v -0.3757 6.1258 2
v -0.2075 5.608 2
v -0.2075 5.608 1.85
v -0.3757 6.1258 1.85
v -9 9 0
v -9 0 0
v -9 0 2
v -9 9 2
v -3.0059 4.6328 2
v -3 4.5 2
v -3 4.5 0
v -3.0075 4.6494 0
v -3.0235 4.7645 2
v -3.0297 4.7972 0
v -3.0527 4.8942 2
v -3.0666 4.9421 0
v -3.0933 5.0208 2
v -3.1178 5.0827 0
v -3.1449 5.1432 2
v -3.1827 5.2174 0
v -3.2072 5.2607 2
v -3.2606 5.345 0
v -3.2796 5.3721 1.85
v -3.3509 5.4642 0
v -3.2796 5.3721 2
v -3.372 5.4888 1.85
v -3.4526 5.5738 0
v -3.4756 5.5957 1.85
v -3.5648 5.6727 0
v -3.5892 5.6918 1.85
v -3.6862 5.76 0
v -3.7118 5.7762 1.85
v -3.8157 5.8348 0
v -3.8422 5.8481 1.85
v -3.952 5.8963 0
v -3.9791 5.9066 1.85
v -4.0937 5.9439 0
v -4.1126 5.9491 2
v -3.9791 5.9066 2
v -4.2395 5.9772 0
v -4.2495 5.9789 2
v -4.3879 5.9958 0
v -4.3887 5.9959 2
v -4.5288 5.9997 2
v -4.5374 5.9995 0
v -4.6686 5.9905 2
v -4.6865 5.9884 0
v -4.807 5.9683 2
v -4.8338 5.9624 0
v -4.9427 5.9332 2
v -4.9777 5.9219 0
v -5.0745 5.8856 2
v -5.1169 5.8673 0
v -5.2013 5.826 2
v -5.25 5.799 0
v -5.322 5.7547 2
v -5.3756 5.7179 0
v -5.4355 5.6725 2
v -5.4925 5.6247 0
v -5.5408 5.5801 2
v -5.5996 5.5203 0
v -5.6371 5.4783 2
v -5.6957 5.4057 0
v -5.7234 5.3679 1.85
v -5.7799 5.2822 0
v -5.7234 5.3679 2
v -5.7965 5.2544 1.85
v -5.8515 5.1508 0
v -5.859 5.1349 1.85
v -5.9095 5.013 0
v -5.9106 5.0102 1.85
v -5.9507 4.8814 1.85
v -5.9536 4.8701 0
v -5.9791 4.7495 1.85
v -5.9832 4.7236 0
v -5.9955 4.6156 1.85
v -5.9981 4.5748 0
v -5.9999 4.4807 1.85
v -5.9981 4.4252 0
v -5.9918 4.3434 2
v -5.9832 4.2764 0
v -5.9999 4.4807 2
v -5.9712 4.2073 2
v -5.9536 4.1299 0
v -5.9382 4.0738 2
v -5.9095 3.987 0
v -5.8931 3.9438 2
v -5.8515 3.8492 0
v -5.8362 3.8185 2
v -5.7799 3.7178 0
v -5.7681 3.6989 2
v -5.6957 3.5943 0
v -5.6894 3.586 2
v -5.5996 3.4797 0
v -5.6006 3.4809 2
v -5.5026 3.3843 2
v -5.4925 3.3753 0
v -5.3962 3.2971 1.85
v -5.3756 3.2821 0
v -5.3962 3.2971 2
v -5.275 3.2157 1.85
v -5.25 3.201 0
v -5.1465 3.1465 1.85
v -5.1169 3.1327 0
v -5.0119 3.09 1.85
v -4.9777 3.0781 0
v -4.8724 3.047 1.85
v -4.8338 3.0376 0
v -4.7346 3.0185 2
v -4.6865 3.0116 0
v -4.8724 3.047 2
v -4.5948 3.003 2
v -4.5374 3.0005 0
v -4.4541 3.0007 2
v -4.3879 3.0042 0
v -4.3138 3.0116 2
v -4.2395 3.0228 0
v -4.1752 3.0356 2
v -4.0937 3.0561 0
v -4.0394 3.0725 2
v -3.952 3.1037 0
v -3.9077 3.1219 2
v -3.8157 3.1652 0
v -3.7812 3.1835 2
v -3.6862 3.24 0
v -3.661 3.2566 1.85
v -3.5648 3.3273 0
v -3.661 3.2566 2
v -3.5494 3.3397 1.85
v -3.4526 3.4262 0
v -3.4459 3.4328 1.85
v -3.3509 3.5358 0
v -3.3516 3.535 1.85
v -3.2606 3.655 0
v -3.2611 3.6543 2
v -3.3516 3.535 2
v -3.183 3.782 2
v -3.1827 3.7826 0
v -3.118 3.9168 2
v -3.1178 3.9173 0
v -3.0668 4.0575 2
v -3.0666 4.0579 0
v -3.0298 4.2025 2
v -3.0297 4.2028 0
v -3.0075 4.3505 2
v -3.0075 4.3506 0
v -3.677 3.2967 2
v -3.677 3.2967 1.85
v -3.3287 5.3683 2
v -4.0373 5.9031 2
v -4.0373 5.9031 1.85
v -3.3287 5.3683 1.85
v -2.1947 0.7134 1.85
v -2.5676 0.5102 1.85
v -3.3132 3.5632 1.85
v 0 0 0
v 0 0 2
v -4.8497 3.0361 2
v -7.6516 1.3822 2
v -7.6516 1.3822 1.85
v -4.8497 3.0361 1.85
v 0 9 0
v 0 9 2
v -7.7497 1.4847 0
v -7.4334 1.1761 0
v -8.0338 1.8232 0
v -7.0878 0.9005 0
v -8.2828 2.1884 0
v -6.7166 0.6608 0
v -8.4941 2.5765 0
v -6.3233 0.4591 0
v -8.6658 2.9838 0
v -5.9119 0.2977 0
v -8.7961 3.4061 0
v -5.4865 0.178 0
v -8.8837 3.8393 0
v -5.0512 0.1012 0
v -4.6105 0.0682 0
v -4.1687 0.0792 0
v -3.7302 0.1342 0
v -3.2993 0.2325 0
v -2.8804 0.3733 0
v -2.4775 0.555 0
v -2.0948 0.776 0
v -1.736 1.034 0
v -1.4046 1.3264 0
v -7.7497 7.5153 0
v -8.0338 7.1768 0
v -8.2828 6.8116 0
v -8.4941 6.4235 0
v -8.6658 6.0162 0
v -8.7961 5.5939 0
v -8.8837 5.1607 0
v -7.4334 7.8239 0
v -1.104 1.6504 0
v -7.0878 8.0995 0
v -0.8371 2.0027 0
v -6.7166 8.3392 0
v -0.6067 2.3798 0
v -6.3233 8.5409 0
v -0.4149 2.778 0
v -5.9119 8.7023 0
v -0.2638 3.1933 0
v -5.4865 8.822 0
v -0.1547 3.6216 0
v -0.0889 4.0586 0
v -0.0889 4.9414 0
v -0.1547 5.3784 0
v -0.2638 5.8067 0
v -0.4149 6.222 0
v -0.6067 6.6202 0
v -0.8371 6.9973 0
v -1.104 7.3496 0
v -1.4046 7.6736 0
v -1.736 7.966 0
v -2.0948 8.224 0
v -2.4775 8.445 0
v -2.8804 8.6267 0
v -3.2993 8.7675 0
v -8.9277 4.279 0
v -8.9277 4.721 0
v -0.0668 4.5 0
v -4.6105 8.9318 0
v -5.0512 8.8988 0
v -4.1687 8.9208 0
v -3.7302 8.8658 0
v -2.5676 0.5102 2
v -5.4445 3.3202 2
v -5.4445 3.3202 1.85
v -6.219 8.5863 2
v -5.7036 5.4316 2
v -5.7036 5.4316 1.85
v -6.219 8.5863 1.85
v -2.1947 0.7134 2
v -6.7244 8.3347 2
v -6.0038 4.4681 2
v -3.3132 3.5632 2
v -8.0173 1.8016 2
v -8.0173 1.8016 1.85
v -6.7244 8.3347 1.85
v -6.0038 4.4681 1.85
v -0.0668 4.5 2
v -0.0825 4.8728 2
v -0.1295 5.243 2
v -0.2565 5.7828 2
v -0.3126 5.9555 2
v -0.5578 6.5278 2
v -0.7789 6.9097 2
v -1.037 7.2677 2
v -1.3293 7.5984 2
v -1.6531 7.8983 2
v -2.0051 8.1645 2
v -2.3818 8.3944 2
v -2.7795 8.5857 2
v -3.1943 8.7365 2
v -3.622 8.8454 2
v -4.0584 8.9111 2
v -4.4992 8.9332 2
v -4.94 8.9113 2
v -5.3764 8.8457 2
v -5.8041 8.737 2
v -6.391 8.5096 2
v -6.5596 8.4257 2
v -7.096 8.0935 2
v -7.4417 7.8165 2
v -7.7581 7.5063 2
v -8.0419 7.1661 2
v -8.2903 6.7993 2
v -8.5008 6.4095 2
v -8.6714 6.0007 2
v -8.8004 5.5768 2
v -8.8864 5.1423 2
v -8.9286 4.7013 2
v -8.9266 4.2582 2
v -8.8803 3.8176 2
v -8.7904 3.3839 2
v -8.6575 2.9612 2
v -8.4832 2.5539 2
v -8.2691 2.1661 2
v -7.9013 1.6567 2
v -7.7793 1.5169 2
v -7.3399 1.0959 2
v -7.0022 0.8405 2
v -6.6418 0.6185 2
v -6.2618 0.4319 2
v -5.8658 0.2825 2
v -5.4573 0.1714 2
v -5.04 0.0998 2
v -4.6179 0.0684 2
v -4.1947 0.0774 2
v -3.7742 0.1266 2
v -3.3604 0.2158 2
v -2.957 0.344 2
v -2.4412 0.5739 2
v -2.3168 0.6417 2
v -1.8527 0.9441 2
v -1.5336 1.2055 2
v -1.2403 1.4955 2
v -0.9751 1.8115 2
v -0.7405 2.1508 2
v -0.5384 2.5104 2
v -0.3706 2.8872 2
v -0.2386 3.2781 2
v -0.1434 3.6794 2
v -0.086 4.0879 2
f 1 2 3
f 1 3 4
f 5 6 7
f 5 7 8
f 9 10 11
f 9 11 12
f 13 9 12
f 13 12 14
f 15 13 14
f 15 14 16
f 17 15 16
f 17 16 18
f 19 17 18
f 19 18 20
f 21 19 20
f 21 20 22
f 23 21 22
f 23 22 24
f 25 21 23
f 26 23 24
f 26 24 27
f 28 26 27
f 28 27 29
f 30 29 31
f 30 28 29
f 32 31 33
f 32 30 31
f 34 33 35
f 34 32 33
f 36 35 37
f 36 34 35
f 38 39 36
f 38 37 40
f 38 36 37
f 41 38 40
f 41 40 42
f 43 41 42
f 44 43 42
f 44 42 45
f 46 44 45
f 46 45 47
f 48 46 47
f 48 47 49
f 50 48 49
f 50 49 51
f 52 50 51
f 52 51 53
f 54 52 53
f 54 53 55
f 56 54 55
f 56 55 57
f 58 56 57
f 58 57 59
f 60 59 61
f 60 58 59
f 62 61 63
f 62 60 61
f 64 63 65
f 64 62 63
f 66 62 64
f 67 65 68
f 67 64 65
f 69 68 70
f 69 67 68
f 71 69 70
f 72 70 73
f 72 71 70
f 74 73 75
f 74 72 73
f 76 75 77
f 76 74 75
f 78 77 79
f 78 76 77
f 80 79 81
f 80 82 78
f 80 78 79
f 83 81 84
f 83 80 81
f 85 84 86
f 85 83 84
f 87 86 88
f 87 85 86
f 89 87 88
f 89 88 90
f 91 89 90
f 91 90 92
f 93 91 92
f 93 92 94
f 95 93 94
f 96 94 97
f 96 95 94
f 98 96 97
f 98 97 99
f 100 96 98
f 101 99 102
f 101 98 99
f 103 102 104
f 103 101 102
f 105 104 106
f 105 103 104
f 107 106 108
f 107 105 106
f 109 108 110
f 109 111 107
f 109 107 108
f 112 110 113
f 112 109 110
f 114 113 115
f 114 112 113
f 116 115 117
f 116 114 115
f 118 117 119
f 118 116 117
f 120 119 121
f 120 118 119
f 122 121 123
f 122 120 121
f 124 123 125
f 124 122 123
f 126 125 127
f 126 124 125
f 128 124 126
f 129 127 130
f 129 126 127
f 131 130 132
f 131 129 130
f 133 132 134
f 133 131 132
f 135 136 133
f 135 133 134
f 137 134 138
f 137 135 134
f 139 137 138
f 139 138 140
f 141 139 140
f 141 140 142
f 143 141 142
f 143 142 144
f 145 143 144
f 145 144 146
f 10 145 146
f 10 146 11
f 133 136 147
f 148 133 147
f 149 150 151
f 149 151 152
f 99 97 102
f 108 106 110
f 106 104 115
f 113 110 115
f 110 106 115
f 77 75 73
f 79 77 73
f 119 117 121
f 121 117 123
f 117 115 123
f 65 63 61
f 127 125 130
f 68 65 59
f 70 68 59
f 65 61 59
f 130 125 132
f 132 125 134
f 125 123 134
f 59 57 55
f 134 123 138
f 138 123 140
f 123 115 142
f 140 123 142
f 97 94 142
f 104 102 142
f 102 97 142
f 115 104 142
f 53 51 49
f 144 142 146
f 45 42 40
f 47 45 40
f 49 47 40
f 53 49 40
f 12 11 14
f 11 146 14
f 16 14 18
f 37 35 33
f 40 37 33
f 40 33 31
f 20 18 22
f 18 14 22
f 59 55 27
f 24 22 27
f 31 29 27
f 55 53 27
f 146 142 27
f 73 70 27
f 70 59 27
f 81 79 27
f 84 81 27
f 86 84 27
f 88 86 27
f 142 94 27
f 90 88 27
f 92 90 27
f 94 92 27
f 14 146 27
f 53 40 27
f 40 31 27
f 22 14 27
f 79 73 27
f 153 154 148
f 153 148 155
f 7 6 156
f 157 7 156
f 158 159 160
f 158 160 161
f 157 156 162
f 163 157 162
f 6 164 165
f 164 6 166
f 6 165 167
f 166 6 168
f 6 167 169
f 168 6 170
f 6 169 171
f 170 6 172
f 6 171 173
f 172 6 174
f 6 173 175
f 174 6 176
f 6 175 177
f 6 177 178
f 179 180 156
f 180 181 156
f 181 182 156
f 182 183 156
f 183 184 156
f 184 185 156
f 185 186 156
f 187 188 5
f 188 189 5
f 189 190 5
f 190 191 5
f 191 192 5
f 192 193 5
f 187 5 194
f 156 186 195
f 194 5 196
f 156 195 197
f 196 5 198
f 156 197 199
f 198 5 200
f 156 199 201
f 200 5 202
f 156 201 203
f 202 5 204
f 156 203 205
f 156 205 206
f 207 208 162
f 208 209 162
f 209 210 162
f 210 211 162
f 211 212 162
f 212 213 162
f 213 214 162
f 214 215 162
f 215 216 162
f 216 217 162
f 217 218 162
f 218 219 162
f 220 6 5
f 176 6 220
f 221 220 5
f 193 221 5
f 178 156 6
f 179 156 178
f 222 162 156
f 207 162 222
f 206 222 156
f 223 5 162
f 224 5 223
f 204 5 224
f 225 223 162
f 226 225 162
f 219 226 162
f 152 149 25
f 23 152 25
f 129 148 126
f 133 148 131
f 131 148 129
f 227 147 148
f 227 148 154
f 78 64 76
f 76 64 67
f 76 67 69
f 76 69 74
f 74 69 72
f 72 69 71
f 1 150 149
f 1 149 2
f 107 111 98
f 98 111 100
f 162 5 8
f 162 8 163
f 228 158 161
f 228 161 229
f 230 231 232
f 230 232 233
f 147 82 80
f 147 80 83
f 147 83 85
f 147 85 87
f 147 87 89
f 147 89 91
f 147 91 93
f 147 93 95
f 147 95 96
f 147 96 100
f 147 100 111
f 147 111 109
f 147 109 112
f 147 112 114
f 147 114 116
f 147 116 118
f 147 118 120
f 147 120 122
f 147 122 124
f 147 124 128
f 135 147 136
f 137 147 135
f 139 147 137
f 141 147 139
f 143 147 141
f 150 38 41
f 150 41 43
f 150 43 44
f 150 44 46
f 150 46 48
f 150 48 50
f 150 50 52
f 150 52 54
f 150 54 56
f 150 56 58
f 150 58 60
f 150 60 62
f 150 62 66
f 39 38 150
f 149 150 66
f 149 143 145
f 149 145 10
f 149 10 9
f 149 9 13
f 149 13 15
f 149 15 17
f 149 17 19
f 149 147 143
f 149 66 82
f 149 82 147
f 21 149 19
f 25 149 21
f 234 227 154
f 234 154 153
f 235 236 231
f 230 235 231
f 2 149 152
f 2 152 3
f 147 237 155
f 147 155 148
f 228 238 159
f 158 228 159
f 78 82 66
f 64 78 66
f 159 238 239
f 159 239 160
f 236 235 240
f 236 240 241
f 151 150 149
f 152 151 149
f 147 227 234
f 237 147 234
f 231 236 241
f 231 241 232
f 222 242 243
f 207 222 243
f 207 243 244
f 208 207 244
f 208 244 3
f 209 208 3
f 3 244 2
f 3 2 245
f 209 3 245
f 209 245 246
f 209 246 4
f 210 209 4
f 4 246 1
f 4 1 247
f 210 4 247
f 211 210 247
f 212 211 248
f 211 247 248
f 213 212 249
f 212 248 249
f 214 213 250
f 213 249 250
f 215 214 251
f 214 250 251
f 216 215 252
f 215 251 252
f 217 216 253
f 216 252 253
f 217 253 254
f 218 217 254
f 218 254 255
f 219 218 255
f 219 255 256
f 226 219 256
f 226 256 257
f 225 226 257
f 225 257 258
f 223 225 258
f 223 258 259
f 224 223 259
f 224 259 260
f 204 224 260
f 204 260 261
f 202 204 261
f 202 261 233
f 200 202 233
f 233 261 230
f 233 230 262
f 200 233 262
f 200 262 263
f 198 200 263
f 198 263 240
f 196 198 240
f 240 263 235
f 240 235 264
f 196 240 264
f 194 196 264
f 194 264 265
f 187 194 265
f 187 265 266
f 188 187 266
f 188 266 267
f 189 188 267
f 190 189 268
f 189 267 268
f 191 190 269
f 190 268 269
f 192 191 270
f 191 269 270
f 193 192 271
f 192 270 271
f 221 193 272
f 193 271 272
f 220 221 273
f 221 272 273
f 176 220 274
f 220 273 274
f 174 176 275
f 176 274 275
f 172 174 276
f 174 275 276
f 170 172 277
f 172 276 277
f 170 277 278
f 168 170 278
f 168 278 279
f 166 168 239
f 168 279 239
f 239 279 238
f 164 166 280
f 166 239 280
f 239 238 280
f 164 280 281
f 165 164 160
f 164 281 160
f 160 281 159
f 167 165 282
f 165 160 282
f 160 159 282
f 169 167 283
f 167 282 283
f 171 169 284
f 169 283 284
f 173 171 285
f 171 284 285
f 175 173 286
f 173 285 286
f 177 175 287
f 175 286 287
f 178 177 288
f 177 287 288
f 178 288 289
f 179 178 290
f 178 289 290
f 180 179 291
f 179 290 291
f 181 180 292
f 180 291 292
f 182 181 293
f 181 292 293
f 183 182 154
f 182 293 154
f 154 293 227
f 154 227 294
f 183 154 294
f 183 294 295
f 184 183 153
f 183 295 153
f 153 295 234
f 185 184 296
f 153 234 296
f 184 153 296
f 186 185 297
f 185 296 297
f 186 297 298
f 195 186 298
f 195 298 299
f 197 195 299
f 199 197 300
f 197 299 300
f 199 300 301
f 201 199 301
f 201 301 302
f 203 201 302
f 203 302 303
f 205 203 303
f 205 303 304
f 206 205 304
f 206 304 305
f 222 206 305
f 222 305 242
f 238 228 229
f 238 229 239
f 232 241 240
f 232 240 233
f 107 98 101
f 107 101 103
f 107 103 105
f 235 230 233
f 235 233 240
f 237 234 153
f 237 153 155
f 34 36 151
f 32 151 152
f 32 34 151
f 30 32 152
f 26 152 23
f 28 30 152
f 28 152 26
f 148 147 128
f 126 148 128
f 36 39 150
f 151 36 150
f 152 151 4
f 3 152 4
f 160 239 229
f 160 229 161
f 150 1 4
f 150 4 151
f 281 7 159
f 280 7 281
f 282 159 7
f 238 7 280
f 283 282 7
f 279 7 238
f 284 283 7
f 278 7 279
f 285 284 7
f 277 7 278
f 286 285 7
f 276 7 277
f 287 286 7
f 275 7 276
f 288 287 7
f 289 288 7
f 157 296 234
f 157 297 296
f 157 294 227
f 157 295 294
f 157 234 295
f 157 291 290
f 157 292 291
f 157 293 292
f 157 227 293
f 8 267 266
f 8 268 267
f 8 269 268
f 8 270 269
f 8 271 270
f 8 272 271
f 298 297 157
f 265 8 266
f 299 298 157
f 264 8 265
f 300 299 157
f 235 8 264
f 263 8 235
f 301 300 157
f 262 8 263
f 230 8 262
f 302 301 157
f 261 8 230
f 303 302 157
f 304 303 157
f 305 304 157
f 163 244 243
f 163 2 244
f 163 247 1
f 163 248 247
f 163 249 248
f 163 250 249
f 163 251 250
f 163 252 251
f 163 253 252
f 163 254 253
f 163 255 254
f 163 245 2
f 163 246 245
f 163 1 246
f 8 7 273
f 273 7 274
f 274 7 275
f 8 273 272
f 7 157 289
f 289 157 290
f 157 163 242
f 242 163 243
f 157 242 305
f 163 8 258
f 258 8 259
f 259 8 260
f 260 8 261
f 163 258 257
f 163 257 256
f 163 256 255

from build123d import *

# Parameters (mm, degrees)
F0_W     = 9
F0_H     = 9
F1_DEPTH = 2
F2_R     = 4.43316962
F2_R_2   = 1.5
F3_DEPTH = 3
F5_DEPTH = 0.15
F6_DEPTH = 0.15


# Not quite as in the source:
# - a feature of the source that left no trace in its solid (it failed there, or was rolled back) is left out
# - the program builds the solid bodies; features that only make, move or delete a surface that nothing else refers to are left out


with BuildPart() as f1:
    # F0 (on Top) → F1 (new body)
    with BuildSketch(Plane.XY):
        with Locations((-4.5, 4.5)):
            Rectangle(F0_W, F0_H)
    extrude(amount=F1_DEPTH)

    # F2 (on face) → F3 (cut)
    with BuildSketch(Plane.XY.offset(2)):
        with Locations((-4.5, 4.5)):
            Circle(F2_R)
        with Locations((-4.5, 4.5)):
            Circle(F2_R_2, mode=Mode.SUBTRACT)
    extrude(amount=-F3_DEPTH, mode=Mode.SUBTRACT)

    # F4 (on face) → F5 (cut)
    with BuildSketch(Plane.XY.offset(2)):
        Polygon((-6.7244199271, 8.3347032307), (-6.0038217343, 4.4680763967), (-5.7035977952, 5.4315547459), (-6.2189687337, 8.5863356901), align=None)
        Polygon((-0.3756961864, 6.1257647226), (-4.0373285301, 5.9030898847), (-3.3286872786, 5.3683454171), (-0.2075215072, 5.6079807167), align=None)
        Polygon((-4.849715769, 3.0361308041), (-5.4445206188, 3.3202320337), (-8.017316279, 1.8015784108), (-7.6516059208, 1.3822487271), align=None)
        Polygon((-3.3131770324, 3.5631777719), (-3.6769588478, 3.2967031002), (-2.5675997073, 0.510160155), (-2.1946810339, 0.7133791655), align=None)
    extrude(amount=-F5_DEPTH, mode=Mode.SUBTRACT)


with BuildPart() as f6:
    # F4 (on face) → F6 (new body)
    with BuildSketch(Plane.XY.offset(2)):
        Polygon((-6.7244199271, 8.3347032307), (-6.0038217343, 4.4680763967), (-5.7035977952, 5.4315547459), (-6.2189687337, 8.5863356901), align=None)
    extrude(amount=-F6_DEPTH)


with BuildPart() as f6b:
    # F4 (on face) → F6, piece 2 (new body)
    with BuildSketch(Plane.XY.offset(2)):
        Polygon((-0.3756961864, 6.1257647226), (-4.0373285301, 5.9030898847), (-3.3286872786, 5.3683454171), (-0.2075215072, 5.6079807167), align=None)
    extrude(amount=-F6_DEPTH)


with BuildPart() as f6c:
    # F4 (on face) → F6, piece 3 (new body)
    with BuildSketch(Plane.XY.offset(2)):
        Polygon((-4.849715769, 3.0361308041), (-5.4445206188, 3.3202320337), (-8.017316279, 1.8015784108), (-7.6516059208, 1.3822487271), align=None)
    extrude(amount=-F6_DEPTH)


with BuildPart() as f6d:
    # F4 (on face) → F6, piece 4 (new body)
    with BuildSketch(Plane.XY.offset(2)):
        Polygon((-3.3131770324, 3.5631777719), (-3.6769588478, 3.2967031002), (-2.5675997073, 0.510160155), (-2.1946810339, 0.7133791655), align=None)
    extrude(amount=-F6_DEPTH)


solid = Compound([f1.part, f6.part, f6b.part, f6c.part, f6d.part])
